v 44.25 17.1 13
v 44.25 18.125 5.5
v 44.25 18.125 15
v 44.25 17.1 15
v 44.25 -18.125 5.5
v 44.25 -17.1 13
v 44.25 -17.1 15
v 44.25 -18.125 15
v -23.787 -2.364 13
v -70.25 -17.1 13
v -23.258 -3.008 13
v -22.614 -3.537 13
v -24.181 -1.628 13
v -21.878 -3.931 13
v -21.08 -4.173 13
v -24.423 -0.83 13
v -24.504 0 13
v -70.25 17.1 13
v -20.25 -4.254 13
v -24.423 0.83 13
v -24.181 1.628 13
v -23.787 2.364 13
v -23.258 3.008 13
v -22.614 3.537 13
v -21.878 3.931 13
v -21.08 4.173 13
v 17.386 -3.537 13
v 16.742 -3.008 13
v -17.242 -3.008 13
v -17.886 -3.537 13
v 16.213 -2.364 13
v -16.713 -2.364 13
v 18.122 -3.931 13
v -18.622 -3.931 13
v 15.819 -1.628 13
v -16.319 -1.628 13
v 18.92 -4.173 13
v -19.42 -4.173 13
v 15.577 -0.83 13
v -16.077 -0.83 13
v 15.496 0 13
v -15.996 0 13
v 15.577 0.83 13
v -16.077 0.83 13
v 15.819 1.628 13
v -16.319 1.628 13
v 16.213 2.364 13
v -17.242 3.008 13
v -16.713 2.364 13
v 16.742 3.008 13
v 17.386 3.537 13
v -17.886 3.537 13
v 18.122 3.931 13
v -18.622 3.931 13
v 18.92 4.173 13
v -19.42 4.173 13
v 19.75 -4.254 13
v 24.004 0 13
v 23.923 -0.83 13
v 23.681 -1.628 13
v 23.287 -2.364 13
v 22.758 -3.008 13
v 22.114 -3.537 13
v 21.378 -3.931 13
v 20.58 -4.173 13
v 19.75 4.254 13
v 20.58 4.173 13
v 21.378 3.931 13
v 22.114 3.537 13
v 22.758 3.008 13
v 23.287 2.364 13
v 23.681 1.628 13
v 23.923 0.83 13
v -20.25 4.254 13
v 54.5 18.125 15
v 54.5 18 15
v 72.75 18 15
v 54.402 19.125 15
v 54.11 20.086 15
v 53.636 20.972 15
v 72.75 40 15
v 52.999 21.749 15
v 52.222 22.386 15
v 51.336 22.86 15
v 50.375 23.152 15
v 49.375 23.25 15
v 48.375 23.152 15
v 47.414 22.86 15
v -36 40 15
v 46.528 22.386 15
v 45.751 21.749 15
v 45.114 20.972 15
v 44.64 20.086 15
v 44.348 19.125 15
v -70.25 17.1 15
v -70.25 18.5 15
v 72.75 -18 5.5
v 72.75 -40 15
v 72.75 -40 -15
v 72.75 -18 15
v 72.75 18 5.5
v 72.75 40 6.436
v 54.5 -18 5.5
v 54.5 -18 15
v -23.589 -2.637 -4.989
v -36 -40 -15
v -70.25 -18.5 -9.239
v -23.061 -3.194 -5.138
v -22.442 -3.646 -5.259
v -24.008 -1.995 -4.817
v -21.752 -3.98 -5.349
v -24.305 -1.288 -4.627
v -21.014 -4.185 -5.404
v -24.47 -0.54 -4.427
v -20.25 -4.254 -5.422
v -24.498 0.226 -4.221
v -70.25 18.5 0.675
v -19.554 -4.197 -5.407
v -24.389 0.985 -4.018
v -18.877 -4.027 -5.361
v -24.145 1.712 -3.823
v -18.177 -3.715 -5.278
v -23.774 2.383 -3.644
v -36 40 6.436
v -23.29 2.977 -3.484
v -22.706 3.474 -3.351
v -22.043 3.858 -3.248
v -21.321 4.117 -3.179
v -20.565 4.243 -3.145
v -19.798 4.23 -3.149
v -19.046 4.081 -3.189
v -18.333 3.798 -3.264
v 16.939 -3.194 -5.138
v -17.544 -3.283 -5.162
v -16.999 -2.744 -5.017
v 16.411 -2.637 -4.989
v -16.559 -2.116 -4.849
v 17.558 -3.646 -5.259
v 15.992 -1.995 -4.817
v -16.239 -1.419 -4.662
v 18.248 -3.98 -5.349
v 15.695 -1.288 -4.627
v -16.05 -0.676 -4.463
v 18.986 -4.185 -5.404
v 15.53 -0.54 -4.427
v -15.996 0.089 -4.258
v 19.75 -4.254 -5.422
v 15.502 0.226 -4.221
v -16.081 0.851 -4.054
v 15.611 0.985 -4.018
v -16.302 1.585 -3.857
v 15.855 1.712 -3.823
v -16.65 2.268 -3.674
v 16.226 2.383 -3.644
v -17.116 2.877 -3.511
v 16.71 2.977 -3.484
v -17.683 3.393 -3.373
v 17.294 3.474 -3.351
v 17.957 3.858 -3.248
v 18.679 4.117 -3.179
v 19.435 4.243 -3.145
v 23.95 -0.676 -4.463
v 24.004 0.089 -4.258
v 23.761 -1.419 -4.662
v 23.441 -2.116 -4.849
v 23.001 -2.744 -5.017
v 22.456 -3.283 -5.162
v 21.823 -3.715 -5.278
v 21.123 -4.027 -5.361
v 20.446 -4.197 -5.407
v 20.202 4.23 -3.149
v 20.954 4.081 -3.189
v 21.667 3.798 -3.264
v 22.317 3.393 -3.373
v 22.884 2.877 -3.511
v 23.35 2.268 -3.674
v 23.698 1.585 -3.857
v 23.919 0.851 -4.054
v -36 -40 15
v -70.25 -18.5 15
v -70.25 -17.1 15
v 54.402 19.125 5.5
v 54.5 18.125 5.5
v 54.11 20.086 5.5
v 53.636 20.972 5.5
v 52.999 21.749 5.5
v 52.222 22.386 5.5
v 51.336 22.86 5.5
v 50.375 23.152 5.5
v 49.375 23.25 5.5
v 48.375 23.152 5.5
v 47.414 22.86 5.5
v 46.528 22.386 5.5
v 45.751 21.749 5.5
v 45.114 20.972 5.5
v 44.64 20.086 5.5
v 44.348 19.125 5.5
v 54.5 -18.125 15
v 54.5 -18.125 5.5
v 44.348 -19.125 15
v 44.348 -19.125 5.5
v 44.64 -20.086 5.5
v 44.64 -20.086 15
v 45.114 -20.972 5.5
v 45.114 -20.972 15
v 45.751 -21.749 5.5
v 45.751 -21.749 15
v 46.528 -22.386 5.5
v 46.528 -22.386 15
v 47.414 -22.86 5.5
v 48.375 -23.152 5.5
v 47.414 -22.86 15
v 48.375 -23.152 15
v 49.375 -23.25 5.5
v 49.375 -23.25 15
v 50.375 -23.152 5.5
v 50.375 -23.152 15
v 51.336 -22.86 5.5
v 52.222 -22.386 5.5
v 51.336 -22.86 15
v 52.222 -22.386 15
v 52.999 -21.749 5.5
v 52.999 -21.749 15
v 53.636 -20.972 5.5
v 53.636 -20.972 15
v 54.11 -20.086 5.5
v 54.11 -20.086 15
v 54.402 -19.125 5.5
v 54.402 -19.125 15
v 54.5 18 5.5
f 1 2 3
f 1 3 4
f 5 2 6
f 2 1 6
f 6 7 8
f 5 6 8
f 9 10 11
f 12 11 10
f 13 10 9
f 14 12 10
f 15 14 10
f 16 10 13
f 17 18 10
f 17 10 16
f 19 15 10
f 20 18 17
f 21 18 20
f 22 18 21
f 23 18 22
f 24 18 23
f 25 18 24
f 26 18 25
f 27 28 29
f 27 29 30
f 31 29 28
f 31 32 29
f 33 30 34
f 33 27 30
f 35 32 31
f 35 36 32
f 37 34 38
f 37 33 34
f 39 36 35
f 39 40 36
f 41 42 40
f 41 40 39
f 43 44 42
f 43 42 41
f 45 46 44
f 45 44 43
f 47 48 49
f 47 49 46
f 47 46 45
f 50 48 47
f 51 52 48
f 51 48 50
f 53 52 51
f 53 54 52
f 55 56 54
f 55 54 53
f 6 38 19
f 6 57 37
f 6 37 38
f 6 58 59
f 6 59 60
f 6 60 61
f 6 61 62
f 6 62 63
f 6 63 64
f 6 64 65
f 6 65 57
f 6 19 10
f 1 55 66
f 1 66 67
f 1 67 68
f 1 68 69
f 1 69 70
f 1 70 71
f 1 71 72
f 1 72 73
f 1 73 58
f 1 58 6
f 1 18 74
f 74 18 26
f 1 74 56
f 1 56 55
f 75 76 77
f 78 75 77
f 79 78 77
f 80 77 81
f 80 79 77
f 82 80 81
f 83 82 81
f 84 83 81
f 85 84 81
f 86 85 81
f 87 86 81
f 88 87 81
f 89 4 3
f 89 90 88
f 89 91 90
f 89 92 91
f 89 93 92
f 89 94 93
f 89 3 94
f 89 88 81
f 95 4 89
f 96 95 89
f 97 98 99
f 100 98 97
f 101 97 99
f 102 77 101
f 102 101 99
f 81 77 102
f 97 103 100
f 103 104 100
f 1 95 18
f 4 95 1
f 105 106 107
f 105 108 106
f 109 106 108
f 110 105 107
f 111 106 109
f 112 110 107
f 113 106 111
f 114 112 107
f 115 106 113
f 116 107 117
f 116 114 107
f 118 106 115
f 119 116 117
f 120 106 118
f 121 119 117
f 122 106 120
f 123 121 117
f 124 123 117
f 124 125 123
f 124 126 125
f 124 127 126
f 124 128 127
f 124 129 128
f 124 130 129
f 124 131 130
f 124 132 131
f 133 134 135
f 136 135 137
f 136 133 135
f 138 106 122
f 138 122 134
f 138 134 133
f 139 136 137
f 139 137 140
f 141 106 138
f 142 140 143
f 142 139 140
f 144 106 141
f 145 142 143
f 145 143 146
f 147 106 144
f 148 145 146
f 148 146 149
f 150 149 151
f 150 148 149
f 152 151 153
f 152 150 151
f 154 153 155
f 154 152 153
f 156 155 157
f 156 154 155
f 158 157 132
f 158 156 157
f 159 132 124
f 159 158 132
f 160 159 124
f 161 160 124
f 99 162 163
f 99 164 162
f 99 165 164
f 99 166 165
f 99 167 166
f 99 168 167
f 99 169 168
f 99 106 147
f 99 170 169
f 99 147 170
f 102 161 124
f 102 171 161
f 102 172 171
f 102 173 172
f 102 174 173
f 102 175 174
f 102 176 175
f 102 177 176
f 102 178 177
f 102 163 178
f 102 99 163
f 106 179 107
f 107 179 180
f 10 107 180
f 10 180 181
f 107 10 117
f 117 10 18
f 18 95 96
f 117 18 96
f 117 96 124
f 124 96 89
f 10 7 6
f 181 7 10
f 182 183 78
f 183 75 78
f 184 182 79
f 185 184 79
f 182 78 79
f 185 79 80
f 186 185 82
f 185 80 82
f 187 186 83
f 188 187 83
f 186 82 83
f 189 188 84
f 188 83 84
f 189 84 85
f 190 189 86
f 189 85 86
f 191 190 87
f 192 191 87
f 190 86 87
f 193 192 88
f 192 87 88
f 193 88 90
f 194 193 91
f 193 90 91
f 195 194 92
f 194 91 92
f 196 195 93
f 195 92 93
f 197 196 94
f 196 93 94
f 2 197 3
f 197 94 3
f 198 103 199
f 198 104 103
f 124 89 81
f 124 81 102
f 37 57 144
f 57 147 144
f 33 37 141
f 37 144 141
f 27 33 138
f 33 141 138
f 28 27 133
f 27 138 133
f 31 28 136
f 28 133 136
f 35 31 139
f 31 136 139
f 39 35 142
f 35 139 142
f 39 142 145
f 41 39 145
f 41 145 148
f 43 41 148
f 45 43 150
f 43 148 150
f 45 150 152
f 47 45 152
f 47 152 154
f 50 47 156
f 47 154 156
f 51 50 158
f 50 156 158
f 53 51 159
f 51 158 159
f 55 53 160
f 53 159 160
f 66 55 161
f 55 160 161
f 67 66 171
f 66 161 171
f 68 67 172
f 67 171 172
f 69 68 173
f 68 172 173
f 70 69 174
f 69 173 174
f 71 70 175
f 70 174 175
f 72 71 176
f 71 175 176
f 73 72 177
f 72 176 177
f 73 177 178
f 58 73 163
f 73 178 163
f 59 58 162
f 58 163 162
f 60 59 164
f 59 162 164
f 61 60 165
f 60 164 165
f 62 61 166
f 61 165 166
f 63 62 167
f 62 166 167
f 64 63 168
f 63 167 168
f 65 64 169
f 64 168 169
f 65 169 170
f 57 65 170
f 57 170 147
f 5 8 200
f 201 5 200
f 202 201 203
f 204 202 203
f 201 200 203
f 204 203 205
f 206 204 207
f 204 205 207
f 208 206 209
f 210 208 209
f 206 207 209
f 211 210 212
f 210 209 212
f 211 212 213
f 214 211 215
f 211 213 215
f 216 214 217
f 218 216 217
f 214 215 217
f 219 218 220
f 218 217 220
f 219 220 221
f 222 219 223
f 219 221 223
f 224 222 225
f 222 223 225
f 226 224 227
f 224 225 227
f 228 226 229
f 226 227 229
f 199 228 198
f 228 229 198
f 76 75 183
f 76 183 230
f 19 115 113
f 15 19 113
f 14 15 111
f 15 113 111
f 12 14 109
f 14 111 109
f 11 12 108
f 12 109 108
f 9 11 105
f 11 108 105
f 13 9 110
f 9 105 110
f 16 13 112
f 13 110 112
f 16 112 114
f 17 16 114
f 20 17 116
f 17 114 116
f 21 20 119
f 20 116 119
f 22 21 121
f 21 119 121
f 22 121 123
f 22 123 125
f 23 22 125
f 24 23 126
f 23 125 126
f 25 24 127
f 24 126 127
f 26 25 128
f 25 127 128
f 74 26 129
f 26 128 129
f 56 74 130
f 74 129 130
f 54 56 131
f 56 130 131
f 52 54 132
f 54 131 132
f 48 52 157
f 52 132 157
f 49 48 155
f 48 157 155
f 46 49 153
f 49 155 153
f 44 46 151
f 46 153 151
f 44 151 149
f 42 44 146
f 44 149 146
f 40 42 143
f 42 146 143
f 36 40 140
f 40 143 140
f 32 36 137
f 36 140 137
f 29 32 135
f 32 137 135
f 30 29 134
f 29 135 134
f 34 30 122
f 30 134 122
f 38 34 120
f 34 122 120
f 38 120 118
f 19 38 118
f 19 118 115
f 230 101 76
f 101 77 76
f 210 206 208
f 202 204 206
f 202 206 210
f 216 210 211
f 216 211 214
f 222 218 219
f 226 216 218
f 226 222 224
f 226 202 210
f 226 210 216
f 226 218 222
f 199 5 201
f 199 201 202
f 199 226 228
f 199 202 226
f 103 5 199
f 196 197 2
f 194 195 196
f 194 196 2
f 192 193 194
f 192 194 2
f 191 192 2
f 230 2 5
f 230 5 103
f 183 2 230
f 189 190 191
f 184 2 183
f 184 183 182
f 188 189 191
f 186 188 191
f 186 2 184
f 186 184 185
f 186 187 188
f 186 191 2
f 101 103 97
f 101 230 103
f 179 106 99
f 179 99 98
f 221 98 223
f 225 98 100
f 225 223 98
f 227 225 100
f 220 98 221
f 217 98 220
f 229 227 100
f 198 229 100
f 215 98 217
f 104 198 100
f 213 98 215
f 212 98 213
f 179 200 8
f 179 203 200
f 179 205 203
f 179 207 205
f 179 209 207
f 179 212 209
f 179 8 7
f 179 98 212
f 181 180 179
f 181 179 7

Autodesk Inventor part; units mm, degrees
ref_plane "Right" through (0, 0, 0) normal (1, 0, 0) x (0, 1, 0)
ref_plane "Top" through (0, 0, 0) normal (0, 1, 0) x (-1, 0, 0)
ref_plane "Front" through (0, 0, 0) normal (0, 0, 1) x (1, 0, 0)
sketch "Sketch1" plane through (0, 0, 0) normal (1, 0, 0) x (0, 1, 0)
  line L0 (-40, 15) -> (40, 15)
  line L1 (40, 15) -> (40, -15)
  line L2 (40, -15) -> (-40, -15)
  line L3 (-40, -15) -> (-40, 15)
  line L4 (-40, 15) -> (40, -15) construction
  line L5 (40, 15) -> (-40, -15) construction
  point P0 (0, 0)
  dimension "d0" = 30
  dimension "d1" = 80
extrude "Extrusion1" add sketch "Sketch1" along normal mid plane 140.5
sketch "Sketch2" plane through (-70.25, -40, 15) normal (0, 0, 1) x (1, 0, 0)
  line L0 (140.5, 80) -> (0, 80) construction
  line L1 (0, 0) -> (0, 80) construction
  line L2 (0, 80) -> (0, 58.5)
  line L3 (0, 58.5) -> (34.25, 80)
  line L4 (34.25, 80) -> (0, 80)
  line L5 (0, 21.5) -> (0, 0)
  line L6 (0, 0) -> (34.25, 0)
  line L7 (34.25, 0) -> (0, 21.5)
  line L8 (140.5, 80) -> (140.5, 0) construction
  point P0 (70.25, 40)
  dimension "d4" = 37
  dimension "d6" = 147.882
  dimension "d38" = 106.25
extrude "Extrusion2" cut sketch "Sketch2" against normal through all
sketch "Sketch3" plane through (70.25, -40, 15) normal (0, 0, 1) x (1, 0, 0)
  line L0 (0, 80) -> (0, 0) construction
  line L1 (-140.5, 21.5) -> (-140.5, 58.5) construction
  line L2 (-140.5, 57.1) -> (0, 57.1)
  line L3 (0, 57.1) -> (0, 22.9)
  line L4 (0, 22.9) -> (-140.5, 22.9)
  line L5 (-140.5, 22.9) -> (-140.5, 57.1)
  point P0 (-70.25, 40)
  point P1 (-140.5, 40)
  dimension "d9" = 34.2
extrude "Extrusion3" cut sketch "Sketch3" against normal blind 2
sketch "Sketch4" plane through (-36, 40, 15) normal (0, 0, 1) x (1, 0, 0)
  line L0 (106.25, -57.1) -> (-34.25, -57.1) construction
  line L1 (-34.25, -58.5) -> (-34.25, -57.1) construction
  line L2 (-34.25, -58.5) -> (0, -80) construction
  line L3 (0, -80) -> (106.25, -80) construction
  line L4 (106.25, -57.1) -> (106.25, -80) construction
  line L5 (-34.25, -22.9) -> (106.25, -22.9) construction
  line L6 (-34.25, -57.1) -> (-34.25, -22.9) construction
  line L7 (106.25, -57.1) -> (-34.25, -57.1) construction
  line L8 (106.25, -22.9) -> (106.25, -57.1) construction
  line L9 (106.25, -22) -> (80.25, -22)
  line L10 (80.25, -22) -> (80.25, -58)
  line L11 (80.25, -58) -> (106.25, -58)
  line L12 (106.25, -58) -> (106.25, -22)
  line L13 (85.375, -21.875) -> (85.375, -58.125) construction
  line L14 (90.5, -21.875) -> (90.5, -58.125)
  line L15 (80.25, -58.125) -> (80.25, -21.875)
  arc A0 (90.5, -21.875) -> (80.25, -21.875) centre (85.375, -21.875) ccw
  arc A1 (80.25, -58.125) -> (90.5, -58.125) centre (85.375, -58.125) ccw
  point P0 (36, -40)
  point P1 (106.25, -40)
  point P2 (85.375, -40)
  point P3 (80.25, -40)
  dimension "d12" = 36
  dimension "d13" = 26
  dimension "d14" = 46.5
  dimension "d15" = 15.75
extrude "Extrusion4" cut sketch "Sketch4" against normal blind 9.5
sketch "Sketch5" plane through (70.25, -40, 13) normal (0, 0, 1) x (1, 0, 0)
  line L0 (-26, 22.9) -> (-26, 57.1) construction
  line L1 (-15.75, 58) -> (0, 58) construction
  line L2 (-15.75, 58.125) -> (-15.75, 58) construction
  arc A0 (-15.75, 58.125) -> (-26, 58.125) centre (-20.875, 58.125) ccw construction
  line L3 (-26, 21.875) -> (-26, 58.125) construction
  arc A1 (-26, 21.875) -> (-15.75, 21.875) centre (-20.875, 21.875) ccw construction
  line L4 (-15.75, 22) -> (-15.75, 21.875) construction
  line L5 (0, 22) -> (-15.75, 22) construction
  line L6 (0, 58) -> (0, 22) construction
  line L7 (-90.5, 40) -> (-50.5, 40)
  circle A2 centre (-90.5, 40) radius 4.25
  circle A3 centre (-50.5, 40) radius 4.25
  point P0 (-70.25, 40)
  dimension "d18" = 8.5
  dimension "d19" = 48.5
  dimension "d20" = 20.25
  dimension "d23" = 50.5
  dimension "d24" = 40
hole "Hole1" at (-20.25, 0, 13) at (19.75, 0, 13) direction (0, 0, -1) diameter 8.509 end through all
sketch "Sketch6" plane through (70.25, 0, 0) normal (1, 0, 0) x (0, 0, -1)
  line L0 (15, -40) -> (15, 40) construction
  line L1 (15, 40) -> (-15, 40) construction
  line L2 (15, -40) -> (-6.4359, 40)
  line L3 (-6.4359, 40) -> (15, 40)
  line L4 (15, 40) -> (15, -40)
  point P0 (0, 0)
  dimension "d32" = 15
extrude "Extrusion5" cut sketch "Sketch6" against normal through all
move faces "Move1" translate (2.5, 0, 0) faces at (70.25, -13.3333, -1.3333)
equation "\"BendRadius\" = Thickness"
equation "\"BendReliefWidth\" = 0.5 * Thickness"
equation "\"BendReliefDepth\" = 0.5 * Thickness"
equation "\"CornerReliefSize\" = 4 * Thickness"
equation "\"MinimumRemnant\" = 2 * Thickness"
equation "\"TransitionRadius\" = BendRadius"
equation "\"JacobiRadiusSize\" = BendRadius"
equation "\"Thickness\" = 6.35"
properties part number "DHC-1500-FF-02-003-CAST" material "A36"
